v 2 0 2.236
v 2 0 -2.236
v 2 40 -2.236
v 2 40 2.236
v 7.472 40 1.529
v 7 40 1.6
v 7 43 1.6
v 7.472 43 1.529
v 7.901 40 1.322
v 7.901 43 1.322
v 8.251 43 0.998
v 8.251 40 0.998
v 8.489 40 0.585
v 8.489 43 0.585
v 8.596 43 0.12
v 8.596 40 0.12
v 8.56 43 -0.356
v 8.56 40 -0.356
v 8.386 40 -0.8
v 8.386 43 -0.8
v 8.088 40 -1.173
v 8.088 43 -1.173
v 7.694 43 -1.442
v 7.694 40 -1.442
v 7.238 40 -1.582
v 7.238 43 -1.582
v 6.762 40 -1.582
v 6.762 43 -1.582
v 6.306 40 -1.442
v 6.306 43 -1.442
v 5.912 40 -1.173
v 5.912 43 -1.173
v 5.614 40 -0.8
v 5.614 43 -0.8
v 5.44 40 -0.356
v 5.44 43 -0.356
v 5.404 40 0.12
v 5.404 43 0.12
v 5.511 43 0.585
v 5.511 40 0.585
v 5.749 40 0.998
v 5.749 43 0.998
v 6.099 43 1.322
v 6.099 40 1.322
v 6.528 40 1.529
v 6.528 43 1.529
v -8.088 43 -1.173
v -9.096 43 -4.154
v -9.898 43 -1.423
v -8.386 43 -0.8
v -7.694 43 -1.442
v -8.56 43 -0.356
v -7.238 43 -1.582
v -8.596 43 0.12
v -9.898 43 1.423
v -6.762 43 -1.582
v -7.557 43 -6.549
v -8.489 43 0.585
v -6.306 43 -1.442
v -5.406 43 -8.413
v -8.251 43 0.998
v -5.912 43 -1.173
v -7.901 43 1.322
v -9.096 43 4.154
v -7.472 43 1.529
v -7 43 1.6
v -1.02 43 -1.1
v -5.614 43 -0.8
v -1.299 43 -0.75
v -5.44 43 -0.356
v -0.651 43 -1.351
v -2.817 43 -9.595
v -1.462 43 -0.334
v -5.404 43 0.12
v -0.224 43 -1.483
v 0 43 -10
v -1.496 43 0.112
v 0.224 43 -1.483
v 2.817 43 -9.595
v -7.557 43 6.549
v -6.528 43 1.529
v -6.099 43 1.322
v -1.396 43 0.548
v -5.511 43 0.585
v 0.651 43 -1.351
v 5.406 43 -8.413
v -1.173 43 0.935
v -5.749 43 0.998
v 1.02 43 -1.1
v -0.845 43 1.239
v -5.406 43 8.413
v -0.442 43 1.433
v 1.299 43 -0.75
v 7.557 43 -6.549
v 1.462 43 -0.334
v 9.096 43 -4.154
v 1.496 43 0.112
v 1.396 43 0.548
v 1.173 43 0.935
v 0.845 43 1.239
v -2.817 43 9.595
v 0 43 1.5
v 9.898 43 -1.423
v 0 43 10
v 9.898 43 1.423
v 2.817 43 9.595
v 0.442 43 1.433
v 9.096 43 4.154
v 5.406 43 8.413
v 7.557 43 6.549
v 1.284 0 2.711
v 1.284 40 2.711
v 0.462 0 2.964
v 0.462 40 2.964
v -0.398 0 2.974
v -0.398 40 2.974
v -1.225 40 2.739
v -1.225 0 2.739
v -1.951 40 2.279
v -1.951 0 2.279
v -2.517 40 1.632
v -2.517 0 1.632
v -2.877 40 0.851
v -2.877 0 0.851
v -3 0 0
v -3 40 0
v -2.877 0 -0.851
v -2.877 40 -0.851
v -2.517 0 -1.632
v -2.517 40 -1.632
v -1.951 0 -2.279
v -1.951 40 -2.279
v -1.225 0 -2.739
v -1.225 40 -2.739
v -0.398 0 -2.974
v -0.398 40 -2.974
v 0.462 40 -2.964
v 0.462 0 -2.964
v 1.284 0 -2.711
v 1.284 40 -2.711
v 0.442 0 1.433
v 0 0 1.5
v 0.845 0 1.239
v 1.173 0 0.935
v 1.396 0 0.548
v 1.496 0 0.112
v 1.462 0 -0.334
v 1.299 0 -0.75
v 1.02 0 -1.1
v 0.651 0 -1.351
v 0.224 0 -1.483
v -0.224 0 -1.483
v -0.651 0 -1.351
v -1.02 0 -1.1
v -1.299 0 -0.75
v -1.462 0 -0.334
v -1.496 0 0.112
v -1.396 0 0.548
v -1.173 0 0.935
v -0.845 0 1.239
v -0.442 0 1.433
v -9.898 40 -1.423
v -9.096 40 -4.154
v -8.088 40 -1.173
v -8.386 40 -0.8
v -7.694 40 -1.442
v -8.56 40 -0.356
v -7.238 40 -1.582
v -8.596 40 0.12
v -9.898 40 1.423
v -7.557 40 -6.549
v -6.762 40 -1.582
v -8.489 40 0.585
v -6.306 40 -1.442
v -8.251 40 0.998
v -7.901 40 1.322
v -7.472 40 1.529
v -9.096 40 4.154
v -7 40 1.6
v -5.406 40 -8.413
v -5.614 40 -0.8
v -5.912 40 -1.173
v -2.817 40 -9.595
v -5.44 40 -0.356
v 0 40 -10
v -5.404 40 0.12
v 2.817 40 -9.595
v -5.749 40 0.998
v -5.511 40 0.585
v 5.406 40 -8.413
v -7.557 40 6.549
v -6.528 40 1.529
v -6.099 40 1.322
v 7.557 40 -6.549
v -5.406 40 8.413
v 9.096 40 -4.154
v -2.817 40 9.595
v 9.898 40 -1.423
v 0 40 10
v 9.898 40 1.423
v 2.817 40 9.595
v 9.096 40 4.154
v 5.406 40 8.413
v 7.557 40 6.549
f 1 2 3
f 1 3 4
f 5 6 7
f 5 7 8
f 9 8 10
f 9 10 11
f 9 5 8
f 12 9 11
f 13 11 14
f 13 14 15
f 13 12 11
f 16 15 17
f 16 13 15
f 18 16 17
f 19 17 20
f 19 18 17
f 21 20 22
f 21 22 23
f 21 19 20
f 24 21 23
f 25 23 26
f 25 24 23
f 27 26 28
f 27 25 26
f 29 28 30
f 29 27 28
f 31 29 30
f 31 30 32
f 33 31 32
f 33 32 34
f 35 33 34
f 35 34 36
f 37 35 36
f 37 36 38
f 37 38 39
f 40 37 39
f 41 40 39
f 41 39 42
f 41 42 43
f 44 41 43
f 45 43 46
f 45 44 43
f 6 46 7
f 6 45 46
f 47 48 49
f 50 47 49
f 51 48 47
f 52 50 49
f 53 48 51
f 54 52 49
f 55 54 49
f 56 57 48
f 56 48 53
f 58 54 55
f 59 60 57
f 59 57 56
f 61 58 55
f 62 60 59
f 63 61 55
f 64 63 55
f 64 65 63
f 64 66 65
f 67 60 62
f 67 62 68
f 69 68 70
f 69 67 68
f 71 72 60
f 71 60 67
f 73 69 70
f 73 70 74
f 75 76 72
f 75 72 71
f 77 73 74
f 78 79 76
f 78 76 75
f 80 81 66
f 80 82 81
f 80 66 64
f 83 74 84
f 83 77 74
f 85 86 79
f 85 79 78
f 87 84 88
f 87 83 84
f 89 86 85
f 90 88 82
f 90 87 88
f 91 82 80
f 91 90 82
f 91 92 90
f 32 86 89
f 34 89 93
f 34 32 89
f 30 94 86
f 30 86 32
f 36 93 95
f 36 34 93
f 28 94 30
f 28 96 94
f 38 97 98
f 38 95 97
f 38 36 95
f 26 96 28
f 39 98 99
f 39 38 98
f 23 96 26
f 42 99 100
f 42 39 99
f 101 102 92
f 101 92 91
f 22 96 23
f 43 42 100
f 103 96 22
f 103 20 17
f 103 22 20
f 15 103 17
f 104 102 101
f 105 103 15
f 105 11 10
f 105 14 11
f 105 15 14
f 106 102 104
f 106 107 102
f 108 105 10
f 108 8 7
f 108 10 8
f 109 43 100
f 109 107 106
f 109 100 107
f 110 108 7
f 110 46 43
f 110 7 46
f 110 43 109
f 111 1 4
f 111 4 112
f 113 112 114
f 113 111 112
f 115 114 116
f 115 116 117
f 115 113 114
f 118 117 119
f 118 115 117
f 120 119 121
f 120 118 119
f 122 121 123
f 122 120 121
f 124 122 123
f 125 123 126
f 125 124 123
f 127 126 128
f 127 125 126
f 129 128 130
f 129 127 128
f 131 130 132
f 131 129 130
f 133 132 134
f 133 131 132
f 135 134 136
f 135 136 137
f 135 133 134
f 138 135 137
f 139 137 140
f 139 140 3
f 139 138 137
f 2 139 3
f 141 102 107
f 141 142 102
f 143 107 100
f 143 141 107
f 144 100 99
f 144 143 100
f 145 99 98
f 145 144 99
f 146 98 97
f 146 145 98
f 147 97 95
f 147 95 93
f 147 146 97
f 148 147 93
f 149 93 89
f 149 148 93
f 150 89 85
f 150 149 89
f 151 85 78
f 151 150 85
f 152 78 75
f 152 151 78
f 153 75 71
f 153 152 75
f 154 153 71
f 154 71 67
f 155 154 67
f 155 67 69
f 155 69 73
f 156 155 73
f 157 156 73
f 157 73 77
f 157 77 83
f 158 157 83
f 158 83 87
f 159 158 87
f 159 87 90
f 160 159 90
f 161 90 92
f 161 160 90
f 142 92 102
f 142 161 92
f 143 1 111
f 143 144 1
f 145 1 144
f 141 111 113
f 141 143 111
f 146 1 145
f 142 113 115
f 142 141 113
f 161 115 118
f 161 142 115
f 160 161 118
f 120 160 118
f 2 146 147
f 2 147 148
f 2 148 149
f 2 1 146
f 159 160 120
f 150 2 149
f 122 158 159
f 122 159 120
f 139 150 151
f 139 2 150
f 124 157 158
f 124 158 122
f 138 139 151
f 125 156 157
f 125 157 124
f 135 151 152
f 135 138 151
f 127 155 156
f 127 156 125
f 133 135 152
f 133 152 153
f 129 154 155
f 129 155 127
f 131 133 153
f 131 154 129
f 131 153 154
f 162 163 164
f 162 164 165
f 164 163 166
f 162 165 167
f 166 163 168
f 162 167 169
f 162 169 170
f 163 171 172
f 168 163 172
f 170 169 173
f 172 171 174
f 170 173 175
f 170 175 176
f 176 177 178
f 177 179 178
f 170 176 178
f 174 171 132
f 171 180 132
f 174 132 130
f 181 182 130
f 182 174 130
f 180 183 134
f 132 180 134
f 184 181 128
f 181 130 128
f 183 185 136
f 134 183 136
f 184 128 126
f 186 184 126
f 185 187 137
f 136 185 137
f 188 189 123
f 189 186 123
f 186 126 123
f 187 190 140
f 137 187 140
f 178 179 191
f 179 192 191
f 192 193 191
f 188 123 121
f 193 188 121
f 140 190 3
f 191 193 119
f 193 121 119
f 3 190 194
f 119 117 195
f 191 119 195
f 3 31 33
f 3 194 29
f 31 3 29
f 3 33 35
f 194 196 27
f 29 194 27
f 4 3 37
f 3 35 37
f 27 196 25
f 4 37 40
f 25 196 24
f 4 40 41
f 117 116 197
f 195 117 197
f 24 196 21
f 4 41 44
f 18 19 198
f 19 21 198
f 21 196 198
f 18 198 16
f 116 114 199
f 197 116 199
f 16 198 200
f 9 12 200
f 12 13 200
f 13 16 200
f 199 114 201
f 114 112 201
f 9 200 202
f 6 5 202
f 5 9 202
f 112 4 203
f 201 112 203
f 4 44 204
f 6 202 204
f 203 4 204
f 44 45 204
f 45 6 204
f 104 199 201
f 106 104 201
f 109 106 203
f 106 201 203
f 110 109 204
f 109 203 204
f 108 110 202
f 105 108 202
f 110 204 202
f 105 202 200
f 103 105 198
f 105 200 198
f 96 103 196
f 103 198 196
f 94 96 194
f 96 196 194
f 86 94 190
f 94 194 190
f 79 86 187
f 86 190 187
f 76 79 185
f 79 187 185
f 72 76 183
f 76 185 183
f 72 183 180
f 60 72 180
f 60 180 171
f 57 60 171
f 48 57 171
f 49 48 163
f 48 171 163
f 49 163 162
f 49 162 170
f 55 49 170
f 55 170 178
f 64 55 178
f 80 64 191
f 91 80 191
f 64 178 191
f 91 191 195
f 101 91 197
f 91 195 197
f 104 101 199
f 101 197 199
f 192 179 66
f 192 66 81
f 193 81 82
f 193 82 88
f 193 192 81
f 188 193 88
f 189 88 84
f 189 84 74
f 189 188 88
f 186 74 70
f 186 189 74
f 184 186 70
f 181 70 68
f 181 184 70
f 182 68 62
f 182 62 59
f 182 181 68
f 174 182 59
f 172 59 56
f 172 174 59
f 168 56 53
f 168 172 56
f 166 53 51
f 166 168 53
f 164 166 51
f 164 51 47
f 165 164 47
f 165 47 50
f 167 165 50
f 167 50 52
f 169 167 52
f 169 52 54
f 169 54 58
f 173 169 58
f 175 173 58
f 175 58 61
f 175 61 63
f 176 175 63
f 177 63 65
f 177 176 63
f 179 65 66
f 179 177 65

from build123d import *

# Parameters (mm, degrees)
SKETCH1_R           = 1.5
BOSS_EXTRUDE1_DEPTH = 40
SKETCH2_R           = 10
SKETCH2_R_2         = 1.6
SKETCH2_R_3         = 1.5
BOSS_EXTRUDE2_DEPTH = 3


with BuildPart() as part:
    # Sketch1 → Boss-Extrude1 (new body)
    with BuildSketch(Plane(origin=(0, 0, 0), x_dir=(1, 0, 0), z_dir=(0, 1, 0))):
        with BuildLine():
            Line((2, 2.236067977), (2, -2.236067977))
            ThreePointArc((2, -2.236067977), (-3, 0), (2, 2.236067977))
        make_face()
        with Locations(Location((0, 0, 0), (0, 0, 270))):
            Circle(SKETCH1_R, mode=Mode.SUBTRACT)
    extrude(amount=BOSS_EXTRUDE1_DEPTH)

    # Sketch2 → Boss-Extrude2 (add)
    with BuildSketch(Plane(origin=(0, 40, 0), x_dir=(1, 0, 0), z_dir=(0, 1, 0))):
        with Locations(Location((0, 0, 0), (0, 0, 270))):
            Circle(SKETCH2_R)
        with Locations(Location((-7, 0, 0), (0, 0, 270))):
            Circle(SKETCH2_R_2, mode=Mode.SUBTRACT)
        with Locations(Location((7, 0, 0), (0, 0, 270))):
            Circle(SKETCH2_R_2, mode=Mode.SUBTRACT)
        with Locations(Location((0, 0, 0), (0, 0, 270))):
            Circle(SKETCH2_R_3, mode=Mode.SUBTRACT)
    extrude(amount=BOSS_EXTRUDE2_DEPTH)


solid = part.part
